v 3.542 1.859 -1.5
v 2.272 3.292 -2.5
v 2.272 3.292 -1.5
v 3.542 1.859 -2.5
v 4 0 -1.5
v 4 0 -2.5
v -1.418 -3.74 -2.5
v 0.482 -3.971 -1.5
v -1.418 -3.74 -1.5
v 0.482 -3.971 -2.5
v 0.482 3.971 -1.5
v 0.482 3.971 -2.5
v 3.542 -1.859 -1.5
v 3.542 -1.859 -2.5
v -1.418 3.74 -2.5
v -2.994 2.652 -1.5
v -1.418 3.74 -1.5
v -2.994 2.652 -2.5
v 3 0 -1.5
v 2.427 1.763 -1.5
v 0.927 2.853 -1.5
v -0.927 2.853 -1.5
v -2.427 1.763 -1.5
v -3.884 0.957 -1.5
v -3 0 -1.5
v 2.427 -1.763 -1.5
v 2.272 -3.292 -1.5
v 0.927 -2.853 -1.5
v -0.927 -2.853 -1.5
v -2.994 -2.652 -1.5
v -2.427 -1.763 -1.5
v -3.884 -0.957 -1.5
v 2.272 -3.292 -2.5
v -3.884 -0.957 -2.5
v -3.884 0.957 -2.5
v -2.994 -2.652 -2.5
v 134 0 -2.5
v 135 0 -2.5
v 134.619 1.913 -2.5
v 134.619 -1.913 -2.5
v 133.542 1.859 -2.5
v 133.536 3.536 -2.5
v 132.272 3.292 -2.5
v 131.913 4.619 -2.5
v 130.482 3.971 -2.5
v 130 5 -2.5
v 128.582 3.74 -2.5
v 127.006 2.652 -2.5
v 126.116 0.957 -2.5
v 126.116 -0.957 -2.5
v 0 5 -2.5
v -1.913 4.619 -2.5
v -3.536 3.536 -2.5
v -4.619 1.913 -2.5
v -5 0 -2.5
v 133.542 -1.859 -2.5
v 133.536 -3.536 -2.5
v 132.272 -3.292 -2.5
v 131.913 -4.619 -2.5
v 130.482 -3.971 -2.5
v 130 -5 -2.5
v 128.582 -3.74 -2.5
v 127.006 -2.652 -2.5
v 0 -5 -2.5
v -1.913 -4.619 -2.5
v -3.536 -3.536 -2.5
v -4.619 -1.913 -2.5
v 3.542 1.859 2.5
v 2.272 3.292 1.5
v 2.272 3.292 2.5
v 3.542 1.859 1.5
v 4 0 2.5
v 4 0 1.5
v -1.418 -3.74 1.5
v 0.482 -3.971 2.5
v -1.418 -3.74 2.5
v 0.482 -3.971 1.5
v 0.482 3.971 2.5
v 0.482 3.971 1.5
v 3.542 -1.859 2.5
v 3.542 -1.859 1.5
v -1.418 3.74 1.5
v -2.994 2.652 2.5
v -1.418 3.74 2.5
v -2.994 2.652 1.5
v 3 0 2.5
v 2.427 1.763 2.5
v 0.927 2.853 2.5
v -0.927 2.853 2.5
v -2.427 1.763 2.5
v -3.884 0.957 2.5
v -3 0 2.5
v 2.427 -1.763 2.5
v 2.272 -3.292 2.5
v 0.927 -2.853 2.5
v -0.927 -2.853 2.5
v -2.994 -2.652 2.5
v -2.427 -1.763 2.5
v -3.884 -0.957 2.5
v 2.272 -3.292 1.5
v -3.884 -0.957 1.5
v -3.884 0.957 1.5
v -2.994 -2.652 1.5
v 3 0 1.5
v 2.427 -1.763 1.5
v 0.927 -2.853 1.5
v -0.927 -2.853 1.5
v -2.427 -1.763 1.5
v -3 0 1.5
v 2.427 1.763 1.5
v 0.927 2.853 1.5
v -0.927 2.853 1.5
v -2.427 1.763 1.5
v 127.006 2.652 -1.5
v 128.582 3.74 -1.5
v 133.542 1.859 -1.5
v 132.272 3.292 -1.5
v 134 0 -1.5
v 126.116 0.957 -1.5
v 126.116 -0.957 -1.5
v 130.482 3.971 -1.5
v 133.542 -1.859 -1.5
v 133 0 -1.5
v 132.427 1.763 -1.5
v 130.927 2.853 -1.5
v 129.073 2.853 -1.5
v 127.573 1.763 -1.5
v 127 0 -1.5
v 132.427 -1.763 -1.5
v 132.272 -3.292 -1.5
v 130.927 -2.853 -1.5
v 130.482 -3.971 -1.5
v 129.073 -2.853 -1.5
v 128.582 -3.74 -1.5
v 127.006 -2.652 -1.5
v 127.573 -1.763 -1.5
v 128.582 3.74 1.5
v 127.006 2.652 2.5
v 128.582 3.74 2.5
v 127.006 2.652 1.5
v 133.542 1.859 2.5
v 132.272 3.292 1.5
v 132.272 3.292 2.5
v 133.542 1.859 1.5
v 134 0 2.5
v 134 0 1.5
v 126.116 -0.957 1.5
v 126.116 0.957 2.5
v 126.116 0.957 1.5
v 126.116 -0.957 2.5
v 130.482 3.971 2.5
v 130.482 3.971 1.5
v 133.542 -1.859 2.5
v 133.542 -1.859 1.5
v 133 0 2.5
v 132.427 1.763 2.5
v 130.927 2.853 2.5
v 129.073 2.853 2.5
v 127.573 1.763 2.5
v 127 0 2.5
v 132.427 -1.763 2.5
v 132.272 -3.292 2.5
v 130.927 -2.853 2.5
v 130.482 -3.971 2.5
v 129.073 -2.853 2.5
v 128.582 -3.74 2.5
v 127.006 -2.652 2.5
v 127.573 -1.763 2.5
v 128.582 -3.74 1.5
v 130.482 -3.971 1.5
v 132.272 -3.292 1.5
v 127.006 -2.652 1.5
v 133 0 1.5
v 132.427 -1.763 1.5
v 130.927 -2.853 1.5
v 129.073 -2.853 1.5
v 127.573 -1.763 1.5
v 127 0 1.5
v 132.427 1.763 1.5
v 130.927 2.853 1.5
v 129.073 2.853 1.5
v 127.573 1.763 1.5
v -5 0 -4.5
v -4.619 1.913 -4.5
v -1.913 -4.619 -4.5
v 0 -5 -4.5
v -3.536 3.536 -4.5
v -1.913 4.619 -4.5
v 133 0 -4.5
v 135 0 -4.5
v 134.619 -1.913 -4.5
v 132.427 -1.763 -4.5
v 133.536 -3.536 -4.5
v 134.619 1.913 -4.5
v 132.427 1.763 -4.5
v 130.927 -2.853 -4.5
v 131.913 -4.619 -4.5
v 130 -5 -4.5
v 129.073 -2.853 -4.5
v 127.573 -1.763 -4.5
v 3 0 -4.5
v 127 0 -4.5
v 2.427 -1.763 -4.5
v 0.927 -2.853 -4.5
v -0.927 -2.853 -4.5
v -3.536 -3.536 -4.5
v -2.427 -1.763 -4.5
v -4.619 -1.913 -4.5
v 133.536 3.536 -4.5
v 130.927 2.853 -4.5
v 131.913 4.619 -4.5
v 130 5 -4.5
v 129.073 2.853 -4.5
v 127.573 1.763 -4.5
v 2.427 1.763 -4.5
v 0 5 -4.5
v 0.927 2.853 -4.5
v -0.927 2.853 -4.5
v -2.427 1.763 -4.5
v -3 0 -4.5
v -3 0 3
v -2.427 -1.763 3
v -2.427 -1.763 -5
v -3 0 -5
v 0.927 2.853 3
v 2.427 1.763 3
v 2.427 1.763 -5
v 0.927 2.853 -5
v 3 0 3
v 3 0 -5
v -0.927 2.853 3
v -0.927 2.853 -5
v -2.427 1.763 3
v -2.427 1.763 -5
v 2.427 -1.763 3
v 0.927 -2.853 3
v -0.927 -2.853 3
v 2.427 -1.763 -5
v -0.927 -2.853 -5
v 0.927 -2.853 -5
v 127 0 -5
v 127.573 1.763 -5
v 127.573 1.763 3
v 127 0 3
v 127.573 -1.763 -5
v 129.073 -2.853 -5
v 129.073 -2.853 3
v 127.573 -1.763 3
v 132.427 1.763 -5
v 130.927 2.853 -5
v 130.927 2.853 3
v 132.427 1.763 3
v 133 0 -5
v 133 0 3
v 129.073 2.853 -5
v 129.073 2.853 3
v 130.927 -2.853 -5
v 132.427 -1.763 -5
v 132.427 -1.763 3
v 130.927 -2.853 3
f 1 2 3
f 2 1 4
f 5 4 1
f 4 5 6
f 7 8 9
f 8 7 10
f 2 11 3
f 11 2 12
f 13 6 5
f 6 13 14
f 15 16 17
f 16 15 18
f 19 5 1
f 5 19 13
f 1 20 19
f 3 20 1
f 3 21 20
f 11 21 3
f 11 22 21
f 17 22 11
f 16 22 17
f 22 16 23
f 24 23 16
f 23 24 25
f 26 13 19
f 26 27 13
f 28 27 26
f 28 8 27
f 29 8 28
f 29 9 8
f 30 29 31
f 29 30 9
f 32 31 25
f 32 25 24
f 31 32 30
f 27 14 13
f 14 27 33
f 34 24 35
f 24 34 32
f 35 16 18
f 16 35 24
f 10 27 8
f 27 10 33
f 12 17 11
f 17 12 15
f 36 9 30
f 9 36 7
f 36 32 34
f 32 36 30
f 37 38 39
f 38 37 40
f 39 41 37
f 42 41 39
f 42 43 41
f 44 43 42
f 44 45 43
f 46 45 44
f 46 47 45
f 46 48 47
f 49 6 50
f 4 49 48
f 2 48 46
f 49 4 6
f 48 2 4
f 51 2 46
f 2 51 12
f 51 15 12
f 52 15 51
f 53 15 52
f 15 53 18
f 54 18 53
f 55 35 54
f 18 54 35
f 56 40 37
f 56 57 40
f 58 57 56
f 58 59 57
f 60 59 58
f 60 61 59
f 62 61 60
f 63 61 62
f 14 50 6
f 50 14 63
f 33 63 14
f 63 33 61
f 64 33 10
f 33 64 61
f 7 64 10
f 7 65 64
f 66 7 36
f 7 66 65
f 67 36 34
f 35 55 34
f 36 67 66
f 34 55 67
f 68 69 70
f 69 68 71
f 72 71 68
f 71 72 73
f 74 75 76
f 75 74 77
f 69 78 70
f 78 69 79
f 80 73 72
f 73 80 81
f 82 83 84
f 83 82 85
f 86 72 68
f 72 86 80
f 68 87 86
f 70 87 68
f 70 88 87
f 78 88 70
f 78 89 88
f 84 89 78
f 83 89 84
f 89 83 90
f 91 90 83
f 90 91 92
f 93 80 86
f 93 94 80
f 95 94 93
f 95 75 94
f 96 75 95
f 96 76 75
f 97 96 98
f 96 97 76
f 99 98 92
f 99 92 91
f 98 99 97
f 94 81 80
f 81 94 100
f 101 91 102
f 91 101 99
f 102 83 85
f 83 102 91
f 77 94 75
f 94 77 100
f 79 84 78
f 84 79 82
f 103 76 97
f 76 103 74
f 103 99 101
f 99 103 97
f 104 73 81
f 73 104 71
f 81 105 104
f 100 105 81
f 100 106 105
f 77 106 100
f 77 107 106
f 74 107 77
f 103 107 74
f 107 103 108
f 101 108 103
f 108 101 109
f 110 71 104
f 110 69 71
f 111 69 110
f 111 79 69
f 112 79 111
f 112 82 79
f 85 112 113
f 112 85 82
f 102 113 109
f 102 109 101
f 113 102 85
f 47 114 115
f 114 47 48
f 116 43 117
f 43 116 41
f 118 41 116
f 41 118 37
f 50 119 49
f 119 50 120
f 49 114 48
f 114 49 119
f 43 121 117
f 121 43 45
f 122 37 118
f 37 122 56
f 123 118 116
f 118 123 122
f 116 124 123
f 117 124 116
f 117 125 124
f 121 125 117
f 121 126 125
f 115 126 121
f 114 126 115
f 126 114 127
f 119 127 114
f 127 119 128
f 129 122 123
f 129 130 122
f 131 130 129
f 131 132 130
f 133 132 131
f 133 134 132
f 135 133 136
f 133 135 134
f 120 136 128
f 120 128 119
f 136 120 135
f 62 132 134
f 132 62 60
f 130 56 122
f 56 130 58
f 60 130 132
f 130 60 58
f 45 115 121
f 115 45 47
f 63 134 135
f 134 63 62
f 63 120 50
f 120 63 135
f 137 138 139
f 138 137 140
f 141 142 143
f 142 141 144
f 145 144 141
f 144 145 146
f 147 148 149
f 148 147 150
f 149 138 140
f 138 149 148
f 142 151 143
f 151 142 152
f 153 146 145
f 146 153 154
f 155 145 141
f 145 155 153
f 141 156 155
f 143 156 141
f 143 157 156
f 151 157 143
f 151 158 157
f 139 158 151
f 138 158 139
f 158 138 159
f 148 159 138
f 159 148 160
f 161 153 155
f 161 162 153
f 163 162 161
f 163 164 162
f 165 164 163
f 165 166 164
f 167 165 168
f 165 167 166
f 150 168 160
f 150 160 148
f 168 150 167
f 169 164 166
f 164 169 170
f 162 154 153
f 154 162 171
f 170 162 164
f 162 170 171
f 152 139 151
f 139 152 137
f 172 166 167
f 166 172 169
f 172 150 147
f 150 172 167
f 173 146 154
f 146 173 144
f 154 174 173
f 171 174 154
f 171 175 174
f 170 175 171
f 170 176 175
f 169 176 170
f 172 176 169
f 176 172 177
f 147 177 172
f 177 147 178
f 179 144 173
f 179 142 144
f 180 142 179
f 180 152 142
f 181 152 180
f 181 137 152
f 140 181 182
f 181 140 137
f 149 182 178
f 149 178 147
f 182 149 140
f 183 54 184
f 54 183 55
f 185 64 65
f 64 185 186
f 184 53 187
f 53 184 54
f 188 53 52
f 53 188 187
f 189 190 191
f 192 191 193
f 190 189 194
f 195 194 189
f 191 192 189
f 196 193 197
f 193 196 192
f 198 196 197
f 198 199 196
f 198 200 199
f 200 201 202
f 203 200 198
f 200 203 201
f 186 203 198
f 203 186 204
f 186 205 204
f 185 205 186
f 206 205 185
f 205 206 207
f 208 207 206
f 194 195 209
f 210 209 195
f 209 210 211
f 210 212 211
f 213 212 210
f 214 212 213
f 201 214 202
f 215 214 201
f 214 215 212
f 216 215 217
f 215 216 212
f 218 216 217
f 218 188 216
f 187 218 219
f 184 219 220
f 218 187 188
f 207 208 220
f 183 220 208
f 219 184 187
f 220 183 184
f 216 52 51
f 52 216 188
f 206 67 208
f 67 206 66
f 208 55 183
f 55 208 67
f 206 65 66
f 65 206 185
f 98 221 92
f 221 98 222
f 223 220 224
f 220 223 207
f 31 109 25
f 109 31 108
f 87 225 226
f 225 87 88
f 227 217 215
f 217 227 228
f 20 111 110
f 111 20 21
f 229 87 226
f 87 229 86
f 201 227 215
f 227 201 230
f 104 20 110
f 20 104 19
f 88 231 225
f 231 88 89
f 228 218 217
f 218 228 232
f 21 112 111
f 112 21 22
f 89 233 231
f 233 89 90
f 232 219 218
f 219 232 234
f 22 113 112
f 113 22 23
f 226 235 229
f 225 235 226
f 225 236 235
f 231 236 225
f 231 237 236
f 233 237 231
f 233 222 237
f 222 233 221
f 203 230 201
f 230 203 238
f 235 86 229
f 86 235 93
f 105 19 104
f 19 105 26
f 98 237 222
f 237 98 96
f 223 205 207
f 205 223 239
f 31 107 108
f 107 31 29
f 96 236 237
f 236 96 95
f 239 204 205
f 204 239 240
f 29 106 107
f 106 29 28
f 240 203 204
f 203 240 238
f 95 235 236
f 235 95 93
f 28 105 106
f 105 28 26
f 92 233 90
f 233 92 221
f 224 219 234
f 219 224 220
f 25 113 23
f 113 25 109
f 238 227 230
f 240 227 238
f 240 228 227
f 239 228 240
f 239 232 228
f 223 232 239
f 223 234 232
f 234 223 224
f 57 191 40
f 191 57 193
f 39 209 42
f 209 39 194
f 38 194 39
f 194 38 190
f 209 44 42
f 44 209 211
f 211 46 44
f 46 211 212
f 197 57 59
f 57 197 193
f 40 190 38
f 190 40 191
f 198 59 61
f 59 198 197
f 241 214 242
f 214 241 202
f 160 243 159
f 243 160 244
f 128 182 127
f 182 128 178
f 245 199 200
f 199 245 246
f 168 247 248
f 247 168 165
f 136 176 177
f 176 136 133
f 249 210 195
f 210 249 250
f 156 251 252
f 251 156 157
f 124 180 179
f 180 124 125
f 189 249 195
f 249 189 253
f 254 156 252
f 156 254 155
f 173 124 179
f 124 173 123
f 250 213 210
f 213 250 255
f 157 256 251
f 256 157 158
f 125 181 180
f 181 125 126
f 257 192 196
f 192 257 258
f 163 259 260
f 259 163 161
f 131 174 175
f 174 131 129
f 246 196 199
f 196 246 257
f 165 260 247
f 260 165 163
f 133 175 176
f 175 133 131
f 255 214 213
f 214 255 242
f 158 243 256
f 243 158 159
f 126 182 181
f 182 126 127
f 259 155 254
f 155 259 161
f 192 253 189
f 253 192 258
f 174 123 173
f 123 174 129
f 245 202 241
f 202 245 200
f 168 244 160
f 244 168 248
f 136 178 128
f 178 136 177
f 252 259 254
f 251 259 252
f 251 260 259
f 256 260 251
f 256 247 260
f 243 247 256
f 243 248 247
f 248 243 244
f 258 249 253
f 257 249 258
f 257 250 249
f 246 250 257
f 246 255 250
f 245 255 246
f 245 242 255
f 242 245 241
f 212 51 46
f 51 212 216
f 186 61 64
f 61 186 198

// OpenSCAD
module EffectorStanchion(length) {
  translate([length/2,0,-3.5]) {
    // main beam
    color("lightgray") cube([length,10,2],center=true);
    for(x=[-length/2,length/2]) {
      // beam endings
      translate([x,0,0]) color("lightgray") cylinder(h=2,r=5,center=true);
      // beam axes
      translate([x,0,2.5]) color("darkred") cylinder(h=8,r=3,center=true);
      // beam axis disks
      for(z=[1.5,5.5])
        translate([x,0,z]) color("dimgray") cylinder(h=1,r=4,center=true);
    }
  }
}

EffectorStanchion(130);
